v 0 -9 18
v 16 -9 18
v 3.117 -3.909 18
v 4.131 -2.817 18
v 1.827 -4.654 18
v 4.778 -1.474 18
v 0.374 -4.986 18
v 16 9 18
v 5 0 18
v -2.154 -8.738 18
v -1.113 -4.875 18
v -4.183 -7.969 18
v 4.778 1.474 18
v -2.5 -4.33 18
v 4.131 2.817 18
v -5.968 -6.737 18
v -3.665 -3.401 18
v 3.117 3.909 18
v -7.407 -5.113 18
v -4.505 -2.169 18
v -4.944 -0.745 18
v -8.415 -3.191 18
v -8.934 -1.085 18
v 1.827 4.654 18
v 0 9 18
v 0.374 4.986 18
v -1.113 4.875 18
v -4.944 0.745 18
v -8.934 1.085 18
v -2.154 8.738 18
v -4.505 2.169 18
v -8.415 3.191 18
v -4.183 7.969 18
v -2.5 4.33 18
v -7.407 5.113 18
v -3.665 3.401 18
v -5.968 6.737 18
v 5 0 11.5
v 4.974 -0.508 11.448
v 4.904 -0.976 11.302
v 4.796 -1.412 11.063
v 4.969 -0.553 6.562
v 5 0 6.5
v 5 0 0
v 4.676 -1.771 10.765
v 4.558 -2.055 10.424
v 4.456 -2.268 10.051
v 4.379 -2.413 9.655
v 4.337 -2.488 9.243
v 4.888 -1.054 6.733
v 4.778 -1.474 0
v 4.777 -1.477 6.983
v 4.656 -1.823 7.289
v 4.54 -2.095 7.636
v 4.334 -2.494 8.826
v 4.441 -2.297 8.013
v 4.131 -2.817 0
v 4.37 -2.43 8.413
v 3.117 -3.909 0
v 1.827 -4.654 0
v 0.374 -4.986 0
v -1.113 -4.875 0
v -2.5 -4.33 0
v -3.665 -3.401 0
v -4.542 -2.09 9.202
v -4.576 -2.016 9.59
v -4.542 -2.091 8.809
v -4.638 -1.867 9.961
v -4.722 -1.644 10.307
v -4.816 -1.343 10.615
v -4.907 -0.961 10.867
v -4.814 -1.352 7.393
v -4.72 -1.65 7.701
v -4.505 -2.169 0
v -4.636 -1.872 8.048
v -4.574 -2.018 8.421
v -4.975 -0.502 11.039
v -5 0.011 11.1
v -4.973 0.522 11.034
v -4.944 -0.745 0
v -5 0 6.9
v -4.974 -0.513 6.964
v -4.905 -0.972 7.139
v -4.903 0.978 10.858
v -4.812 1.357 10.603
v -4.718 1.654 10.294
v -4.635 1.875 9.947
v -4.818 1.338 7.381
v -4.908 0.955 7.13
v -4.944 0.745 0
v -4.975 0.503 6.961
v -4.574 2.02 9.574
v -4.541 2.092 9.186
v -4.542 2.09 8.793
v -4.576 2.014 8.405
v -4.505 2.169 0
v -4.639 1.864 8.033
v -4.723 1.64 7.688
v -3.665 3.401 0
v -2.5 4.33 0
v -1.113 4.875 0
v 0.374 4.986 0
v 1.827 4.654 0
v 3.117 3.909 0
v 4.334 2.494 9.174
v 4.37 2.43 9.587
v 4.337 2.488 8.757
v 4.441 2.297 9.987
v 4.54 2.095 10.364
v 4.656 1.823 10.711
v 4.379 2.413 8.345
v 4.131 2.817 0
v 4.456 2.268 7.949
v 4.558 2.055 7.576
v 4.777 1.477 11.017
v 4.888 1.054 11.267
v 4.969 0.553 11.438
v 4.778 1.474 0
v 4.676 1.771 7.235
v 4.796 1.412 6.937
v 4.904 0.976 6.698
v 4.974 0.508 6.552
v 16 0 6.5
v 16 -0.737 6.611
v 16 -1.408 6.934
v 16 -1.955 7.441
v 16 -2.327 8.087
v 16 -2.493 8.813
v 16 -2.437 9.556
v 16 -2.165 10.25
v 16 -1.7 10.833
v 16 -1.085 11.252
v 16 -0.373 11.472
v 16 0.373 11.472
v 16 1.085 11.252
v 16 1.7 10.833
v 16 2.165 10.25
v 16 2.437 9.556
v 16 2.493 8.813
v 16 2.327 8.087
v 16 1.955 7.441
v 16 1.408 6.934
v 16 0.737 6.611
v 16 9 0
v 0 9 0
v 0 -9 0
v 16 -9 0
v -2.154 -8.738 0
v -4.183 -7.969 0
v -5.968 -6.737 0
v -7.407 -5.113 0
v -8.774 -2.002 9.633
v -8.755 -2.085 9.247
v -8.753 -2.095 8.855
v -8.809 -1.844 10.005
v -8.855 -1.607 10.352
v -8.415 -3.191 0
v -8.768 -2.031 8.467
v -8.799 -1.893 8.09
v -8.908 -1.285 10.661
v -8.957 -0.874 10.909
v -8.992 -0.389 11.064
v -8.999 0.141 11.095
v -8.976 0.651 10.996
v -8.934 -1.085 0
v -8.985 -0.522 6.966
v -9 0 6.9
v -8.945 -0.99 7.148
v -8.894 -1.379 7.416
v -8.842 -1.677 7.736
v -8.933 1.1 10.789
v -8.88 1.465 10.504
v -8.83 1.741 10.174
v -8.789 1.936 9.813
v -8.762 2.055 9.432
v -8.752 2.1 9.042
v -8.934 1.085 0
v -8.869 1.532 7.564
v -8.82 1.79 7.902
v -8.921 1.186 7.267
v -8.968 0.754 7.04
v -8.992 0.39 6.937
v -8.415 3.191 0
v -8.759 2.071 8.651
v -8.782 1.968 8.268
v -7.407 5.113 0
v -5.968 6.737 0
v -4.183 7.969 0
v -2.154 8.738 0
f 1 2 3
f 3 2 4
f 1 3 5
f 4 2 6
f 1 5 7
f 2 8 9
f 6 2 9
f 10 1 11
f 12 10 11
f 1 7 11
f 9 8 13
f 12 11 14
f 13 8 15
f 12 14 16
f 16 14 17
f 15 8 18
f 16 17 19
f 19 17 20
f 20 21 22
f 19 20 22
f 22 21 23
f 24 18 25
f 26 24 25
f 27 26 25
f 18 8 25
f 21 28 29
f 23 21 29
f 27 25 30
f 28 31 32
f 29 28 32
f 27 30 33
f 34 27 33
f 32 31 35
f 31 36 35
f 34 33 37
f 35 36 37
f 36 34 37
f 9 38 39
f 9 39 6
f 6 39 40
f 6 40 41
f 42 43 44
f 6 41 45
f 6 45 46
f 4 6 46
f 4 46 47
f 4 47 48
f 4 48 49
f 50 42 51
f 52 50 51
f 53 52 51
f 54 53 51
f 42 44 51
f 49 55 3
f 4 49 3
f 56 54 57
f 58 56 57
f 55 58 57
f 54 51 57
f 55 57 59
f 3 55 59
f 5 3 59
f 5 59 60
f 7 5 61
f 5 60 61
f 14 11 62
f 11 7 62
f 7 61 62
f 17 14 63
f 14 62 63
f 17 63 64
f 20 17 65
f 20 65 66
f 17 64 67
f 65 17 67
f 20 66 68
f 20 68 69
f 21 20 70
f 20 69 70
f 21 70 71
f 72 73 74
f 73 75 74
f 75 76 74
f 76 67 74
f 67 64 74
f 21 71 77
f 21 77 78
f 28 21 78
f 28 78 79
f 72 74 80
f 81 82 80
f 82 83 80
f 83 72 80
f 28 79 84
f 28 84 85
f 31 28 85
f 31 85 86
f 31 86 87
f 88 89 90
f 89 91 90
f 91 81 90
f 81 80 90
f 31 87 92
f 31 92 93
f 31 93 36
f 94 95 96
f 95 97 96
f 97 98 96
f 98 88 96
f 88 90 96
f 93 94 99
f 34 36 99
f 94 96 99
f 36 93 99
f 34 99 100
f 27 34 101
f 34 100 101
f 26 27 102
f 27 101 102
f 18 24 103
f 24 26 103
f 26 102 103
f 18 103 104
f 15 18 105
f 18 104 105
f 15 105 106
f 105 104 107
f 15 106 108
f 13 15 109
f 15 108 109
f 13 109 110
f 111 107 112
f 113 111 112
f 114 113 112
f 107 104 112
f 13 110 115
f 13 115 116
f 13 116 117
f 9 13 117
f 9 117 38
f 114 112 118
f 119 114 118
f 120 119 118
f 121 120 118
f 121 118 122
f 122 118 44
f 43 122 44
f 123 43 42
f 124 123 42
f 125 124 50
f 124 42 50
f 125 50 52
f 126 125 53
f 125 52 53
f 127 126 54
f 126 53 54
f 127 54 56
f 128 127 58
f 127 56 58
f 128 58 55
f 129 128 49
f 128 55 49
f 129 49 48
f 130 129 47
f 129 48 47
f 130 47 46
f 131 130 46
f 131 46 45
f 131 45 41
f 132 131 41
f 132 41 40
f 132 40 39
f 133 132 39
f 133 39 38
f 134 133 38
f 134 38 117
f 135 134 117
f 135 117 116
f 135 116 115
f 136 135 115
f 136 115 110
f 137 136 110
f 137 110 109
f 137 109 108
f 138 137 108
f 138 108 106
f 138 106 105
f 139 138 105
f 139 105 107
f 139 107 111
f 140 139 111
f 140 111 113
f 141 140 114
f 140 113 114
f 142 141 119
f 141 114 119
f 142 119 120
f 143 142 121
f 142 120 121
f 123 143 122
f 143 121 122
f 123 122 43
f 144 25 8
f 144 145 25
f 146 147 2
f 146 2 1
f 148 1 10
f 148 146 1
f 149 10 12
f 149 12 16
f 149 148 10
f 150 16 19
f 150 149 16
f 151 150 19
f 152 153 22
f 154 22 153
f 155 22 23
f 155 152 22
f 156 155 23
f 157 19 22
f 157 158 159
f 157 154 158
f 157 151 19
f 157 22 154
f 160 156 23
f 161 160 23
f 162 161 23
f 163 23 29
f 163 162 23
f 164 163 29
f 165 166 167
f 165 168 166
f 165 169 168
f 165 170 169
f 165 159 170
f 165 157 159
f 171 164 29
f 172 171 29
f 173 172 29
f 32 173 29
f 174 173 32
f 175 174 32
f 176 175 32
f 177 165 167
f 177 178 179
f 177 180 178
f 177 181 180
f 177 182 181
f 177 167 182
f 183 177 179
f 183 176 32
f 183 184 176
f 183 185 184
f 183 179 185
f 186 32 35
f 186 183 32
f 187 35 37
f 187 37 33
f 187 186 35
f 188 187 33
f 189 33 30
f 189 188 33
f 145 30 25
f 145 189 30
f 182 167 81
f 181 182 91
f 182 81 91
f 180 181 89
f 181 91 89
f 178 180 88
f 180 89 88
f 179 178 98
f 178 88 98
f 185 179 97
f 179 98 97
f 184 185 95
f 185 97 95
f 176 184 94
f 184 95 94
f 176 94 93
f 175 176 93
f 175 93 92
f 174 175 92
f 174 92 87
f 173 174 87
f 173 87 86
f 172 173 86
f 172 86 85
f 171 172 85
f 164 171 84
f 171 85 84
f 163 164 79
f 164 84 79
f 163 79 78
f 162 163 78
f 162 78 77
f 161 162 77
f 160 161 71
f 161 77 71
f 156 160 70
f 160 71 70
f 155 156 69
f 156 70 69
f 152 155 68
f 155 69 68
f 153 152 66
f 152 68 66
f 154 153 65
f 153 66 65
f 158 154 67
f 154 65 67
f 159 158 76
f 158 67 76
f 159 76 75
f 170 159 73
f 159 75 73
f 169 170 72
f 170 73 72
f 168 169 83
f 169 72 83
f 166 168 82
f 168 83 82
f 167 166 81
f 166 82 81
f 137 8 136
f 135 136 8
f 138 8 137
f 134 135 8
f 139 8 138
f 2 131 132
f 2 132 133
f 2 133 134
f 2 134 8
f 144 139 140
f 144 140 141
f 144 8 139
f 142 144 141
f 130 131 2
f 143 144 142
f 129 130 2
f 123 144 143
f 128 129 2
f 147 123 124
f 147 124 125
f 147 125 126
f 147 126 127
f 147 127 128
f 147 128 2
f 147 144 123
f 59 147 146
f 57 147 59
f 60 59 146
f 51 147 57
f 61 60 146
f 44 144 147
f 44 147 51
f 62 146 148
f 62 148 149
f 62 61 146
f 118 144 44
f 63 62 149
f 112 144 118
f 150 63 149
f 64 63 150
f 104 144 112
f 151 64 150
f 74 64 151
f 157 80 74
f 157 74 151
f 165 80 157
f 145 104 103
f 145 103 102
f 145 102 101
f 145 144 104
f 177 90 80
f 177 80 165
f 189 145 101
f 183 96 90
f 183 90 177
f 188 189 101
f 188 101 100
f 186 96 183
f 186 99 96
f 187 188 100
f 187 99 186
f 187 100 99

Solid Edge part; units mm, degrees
sketch "Sketch1" plane through (0, 0, 0) normal (0, 0, 1) x (1, 0, 0)
  line L0 (16, -9) -> (0, -9)
  line L1 (0, 9) -> (16, 9)
  line L2 (16, 9) -> (16, -9)
  arc A0 (0, -9) -> (0, 9) centre (0, 0) cw
  circle A1 centre (0, 0) radius 5
extrude "Protrusion1" add sketch "Sketch1" along normal blind 18
hole "Furo_2" at (16, 0, 9) direction (-1, 0, 0) diameter 5 depth 16
hole "Furo_3" at (16, 0, 9) direction (-1, 0, 0) diameter 4.2 end up to next
